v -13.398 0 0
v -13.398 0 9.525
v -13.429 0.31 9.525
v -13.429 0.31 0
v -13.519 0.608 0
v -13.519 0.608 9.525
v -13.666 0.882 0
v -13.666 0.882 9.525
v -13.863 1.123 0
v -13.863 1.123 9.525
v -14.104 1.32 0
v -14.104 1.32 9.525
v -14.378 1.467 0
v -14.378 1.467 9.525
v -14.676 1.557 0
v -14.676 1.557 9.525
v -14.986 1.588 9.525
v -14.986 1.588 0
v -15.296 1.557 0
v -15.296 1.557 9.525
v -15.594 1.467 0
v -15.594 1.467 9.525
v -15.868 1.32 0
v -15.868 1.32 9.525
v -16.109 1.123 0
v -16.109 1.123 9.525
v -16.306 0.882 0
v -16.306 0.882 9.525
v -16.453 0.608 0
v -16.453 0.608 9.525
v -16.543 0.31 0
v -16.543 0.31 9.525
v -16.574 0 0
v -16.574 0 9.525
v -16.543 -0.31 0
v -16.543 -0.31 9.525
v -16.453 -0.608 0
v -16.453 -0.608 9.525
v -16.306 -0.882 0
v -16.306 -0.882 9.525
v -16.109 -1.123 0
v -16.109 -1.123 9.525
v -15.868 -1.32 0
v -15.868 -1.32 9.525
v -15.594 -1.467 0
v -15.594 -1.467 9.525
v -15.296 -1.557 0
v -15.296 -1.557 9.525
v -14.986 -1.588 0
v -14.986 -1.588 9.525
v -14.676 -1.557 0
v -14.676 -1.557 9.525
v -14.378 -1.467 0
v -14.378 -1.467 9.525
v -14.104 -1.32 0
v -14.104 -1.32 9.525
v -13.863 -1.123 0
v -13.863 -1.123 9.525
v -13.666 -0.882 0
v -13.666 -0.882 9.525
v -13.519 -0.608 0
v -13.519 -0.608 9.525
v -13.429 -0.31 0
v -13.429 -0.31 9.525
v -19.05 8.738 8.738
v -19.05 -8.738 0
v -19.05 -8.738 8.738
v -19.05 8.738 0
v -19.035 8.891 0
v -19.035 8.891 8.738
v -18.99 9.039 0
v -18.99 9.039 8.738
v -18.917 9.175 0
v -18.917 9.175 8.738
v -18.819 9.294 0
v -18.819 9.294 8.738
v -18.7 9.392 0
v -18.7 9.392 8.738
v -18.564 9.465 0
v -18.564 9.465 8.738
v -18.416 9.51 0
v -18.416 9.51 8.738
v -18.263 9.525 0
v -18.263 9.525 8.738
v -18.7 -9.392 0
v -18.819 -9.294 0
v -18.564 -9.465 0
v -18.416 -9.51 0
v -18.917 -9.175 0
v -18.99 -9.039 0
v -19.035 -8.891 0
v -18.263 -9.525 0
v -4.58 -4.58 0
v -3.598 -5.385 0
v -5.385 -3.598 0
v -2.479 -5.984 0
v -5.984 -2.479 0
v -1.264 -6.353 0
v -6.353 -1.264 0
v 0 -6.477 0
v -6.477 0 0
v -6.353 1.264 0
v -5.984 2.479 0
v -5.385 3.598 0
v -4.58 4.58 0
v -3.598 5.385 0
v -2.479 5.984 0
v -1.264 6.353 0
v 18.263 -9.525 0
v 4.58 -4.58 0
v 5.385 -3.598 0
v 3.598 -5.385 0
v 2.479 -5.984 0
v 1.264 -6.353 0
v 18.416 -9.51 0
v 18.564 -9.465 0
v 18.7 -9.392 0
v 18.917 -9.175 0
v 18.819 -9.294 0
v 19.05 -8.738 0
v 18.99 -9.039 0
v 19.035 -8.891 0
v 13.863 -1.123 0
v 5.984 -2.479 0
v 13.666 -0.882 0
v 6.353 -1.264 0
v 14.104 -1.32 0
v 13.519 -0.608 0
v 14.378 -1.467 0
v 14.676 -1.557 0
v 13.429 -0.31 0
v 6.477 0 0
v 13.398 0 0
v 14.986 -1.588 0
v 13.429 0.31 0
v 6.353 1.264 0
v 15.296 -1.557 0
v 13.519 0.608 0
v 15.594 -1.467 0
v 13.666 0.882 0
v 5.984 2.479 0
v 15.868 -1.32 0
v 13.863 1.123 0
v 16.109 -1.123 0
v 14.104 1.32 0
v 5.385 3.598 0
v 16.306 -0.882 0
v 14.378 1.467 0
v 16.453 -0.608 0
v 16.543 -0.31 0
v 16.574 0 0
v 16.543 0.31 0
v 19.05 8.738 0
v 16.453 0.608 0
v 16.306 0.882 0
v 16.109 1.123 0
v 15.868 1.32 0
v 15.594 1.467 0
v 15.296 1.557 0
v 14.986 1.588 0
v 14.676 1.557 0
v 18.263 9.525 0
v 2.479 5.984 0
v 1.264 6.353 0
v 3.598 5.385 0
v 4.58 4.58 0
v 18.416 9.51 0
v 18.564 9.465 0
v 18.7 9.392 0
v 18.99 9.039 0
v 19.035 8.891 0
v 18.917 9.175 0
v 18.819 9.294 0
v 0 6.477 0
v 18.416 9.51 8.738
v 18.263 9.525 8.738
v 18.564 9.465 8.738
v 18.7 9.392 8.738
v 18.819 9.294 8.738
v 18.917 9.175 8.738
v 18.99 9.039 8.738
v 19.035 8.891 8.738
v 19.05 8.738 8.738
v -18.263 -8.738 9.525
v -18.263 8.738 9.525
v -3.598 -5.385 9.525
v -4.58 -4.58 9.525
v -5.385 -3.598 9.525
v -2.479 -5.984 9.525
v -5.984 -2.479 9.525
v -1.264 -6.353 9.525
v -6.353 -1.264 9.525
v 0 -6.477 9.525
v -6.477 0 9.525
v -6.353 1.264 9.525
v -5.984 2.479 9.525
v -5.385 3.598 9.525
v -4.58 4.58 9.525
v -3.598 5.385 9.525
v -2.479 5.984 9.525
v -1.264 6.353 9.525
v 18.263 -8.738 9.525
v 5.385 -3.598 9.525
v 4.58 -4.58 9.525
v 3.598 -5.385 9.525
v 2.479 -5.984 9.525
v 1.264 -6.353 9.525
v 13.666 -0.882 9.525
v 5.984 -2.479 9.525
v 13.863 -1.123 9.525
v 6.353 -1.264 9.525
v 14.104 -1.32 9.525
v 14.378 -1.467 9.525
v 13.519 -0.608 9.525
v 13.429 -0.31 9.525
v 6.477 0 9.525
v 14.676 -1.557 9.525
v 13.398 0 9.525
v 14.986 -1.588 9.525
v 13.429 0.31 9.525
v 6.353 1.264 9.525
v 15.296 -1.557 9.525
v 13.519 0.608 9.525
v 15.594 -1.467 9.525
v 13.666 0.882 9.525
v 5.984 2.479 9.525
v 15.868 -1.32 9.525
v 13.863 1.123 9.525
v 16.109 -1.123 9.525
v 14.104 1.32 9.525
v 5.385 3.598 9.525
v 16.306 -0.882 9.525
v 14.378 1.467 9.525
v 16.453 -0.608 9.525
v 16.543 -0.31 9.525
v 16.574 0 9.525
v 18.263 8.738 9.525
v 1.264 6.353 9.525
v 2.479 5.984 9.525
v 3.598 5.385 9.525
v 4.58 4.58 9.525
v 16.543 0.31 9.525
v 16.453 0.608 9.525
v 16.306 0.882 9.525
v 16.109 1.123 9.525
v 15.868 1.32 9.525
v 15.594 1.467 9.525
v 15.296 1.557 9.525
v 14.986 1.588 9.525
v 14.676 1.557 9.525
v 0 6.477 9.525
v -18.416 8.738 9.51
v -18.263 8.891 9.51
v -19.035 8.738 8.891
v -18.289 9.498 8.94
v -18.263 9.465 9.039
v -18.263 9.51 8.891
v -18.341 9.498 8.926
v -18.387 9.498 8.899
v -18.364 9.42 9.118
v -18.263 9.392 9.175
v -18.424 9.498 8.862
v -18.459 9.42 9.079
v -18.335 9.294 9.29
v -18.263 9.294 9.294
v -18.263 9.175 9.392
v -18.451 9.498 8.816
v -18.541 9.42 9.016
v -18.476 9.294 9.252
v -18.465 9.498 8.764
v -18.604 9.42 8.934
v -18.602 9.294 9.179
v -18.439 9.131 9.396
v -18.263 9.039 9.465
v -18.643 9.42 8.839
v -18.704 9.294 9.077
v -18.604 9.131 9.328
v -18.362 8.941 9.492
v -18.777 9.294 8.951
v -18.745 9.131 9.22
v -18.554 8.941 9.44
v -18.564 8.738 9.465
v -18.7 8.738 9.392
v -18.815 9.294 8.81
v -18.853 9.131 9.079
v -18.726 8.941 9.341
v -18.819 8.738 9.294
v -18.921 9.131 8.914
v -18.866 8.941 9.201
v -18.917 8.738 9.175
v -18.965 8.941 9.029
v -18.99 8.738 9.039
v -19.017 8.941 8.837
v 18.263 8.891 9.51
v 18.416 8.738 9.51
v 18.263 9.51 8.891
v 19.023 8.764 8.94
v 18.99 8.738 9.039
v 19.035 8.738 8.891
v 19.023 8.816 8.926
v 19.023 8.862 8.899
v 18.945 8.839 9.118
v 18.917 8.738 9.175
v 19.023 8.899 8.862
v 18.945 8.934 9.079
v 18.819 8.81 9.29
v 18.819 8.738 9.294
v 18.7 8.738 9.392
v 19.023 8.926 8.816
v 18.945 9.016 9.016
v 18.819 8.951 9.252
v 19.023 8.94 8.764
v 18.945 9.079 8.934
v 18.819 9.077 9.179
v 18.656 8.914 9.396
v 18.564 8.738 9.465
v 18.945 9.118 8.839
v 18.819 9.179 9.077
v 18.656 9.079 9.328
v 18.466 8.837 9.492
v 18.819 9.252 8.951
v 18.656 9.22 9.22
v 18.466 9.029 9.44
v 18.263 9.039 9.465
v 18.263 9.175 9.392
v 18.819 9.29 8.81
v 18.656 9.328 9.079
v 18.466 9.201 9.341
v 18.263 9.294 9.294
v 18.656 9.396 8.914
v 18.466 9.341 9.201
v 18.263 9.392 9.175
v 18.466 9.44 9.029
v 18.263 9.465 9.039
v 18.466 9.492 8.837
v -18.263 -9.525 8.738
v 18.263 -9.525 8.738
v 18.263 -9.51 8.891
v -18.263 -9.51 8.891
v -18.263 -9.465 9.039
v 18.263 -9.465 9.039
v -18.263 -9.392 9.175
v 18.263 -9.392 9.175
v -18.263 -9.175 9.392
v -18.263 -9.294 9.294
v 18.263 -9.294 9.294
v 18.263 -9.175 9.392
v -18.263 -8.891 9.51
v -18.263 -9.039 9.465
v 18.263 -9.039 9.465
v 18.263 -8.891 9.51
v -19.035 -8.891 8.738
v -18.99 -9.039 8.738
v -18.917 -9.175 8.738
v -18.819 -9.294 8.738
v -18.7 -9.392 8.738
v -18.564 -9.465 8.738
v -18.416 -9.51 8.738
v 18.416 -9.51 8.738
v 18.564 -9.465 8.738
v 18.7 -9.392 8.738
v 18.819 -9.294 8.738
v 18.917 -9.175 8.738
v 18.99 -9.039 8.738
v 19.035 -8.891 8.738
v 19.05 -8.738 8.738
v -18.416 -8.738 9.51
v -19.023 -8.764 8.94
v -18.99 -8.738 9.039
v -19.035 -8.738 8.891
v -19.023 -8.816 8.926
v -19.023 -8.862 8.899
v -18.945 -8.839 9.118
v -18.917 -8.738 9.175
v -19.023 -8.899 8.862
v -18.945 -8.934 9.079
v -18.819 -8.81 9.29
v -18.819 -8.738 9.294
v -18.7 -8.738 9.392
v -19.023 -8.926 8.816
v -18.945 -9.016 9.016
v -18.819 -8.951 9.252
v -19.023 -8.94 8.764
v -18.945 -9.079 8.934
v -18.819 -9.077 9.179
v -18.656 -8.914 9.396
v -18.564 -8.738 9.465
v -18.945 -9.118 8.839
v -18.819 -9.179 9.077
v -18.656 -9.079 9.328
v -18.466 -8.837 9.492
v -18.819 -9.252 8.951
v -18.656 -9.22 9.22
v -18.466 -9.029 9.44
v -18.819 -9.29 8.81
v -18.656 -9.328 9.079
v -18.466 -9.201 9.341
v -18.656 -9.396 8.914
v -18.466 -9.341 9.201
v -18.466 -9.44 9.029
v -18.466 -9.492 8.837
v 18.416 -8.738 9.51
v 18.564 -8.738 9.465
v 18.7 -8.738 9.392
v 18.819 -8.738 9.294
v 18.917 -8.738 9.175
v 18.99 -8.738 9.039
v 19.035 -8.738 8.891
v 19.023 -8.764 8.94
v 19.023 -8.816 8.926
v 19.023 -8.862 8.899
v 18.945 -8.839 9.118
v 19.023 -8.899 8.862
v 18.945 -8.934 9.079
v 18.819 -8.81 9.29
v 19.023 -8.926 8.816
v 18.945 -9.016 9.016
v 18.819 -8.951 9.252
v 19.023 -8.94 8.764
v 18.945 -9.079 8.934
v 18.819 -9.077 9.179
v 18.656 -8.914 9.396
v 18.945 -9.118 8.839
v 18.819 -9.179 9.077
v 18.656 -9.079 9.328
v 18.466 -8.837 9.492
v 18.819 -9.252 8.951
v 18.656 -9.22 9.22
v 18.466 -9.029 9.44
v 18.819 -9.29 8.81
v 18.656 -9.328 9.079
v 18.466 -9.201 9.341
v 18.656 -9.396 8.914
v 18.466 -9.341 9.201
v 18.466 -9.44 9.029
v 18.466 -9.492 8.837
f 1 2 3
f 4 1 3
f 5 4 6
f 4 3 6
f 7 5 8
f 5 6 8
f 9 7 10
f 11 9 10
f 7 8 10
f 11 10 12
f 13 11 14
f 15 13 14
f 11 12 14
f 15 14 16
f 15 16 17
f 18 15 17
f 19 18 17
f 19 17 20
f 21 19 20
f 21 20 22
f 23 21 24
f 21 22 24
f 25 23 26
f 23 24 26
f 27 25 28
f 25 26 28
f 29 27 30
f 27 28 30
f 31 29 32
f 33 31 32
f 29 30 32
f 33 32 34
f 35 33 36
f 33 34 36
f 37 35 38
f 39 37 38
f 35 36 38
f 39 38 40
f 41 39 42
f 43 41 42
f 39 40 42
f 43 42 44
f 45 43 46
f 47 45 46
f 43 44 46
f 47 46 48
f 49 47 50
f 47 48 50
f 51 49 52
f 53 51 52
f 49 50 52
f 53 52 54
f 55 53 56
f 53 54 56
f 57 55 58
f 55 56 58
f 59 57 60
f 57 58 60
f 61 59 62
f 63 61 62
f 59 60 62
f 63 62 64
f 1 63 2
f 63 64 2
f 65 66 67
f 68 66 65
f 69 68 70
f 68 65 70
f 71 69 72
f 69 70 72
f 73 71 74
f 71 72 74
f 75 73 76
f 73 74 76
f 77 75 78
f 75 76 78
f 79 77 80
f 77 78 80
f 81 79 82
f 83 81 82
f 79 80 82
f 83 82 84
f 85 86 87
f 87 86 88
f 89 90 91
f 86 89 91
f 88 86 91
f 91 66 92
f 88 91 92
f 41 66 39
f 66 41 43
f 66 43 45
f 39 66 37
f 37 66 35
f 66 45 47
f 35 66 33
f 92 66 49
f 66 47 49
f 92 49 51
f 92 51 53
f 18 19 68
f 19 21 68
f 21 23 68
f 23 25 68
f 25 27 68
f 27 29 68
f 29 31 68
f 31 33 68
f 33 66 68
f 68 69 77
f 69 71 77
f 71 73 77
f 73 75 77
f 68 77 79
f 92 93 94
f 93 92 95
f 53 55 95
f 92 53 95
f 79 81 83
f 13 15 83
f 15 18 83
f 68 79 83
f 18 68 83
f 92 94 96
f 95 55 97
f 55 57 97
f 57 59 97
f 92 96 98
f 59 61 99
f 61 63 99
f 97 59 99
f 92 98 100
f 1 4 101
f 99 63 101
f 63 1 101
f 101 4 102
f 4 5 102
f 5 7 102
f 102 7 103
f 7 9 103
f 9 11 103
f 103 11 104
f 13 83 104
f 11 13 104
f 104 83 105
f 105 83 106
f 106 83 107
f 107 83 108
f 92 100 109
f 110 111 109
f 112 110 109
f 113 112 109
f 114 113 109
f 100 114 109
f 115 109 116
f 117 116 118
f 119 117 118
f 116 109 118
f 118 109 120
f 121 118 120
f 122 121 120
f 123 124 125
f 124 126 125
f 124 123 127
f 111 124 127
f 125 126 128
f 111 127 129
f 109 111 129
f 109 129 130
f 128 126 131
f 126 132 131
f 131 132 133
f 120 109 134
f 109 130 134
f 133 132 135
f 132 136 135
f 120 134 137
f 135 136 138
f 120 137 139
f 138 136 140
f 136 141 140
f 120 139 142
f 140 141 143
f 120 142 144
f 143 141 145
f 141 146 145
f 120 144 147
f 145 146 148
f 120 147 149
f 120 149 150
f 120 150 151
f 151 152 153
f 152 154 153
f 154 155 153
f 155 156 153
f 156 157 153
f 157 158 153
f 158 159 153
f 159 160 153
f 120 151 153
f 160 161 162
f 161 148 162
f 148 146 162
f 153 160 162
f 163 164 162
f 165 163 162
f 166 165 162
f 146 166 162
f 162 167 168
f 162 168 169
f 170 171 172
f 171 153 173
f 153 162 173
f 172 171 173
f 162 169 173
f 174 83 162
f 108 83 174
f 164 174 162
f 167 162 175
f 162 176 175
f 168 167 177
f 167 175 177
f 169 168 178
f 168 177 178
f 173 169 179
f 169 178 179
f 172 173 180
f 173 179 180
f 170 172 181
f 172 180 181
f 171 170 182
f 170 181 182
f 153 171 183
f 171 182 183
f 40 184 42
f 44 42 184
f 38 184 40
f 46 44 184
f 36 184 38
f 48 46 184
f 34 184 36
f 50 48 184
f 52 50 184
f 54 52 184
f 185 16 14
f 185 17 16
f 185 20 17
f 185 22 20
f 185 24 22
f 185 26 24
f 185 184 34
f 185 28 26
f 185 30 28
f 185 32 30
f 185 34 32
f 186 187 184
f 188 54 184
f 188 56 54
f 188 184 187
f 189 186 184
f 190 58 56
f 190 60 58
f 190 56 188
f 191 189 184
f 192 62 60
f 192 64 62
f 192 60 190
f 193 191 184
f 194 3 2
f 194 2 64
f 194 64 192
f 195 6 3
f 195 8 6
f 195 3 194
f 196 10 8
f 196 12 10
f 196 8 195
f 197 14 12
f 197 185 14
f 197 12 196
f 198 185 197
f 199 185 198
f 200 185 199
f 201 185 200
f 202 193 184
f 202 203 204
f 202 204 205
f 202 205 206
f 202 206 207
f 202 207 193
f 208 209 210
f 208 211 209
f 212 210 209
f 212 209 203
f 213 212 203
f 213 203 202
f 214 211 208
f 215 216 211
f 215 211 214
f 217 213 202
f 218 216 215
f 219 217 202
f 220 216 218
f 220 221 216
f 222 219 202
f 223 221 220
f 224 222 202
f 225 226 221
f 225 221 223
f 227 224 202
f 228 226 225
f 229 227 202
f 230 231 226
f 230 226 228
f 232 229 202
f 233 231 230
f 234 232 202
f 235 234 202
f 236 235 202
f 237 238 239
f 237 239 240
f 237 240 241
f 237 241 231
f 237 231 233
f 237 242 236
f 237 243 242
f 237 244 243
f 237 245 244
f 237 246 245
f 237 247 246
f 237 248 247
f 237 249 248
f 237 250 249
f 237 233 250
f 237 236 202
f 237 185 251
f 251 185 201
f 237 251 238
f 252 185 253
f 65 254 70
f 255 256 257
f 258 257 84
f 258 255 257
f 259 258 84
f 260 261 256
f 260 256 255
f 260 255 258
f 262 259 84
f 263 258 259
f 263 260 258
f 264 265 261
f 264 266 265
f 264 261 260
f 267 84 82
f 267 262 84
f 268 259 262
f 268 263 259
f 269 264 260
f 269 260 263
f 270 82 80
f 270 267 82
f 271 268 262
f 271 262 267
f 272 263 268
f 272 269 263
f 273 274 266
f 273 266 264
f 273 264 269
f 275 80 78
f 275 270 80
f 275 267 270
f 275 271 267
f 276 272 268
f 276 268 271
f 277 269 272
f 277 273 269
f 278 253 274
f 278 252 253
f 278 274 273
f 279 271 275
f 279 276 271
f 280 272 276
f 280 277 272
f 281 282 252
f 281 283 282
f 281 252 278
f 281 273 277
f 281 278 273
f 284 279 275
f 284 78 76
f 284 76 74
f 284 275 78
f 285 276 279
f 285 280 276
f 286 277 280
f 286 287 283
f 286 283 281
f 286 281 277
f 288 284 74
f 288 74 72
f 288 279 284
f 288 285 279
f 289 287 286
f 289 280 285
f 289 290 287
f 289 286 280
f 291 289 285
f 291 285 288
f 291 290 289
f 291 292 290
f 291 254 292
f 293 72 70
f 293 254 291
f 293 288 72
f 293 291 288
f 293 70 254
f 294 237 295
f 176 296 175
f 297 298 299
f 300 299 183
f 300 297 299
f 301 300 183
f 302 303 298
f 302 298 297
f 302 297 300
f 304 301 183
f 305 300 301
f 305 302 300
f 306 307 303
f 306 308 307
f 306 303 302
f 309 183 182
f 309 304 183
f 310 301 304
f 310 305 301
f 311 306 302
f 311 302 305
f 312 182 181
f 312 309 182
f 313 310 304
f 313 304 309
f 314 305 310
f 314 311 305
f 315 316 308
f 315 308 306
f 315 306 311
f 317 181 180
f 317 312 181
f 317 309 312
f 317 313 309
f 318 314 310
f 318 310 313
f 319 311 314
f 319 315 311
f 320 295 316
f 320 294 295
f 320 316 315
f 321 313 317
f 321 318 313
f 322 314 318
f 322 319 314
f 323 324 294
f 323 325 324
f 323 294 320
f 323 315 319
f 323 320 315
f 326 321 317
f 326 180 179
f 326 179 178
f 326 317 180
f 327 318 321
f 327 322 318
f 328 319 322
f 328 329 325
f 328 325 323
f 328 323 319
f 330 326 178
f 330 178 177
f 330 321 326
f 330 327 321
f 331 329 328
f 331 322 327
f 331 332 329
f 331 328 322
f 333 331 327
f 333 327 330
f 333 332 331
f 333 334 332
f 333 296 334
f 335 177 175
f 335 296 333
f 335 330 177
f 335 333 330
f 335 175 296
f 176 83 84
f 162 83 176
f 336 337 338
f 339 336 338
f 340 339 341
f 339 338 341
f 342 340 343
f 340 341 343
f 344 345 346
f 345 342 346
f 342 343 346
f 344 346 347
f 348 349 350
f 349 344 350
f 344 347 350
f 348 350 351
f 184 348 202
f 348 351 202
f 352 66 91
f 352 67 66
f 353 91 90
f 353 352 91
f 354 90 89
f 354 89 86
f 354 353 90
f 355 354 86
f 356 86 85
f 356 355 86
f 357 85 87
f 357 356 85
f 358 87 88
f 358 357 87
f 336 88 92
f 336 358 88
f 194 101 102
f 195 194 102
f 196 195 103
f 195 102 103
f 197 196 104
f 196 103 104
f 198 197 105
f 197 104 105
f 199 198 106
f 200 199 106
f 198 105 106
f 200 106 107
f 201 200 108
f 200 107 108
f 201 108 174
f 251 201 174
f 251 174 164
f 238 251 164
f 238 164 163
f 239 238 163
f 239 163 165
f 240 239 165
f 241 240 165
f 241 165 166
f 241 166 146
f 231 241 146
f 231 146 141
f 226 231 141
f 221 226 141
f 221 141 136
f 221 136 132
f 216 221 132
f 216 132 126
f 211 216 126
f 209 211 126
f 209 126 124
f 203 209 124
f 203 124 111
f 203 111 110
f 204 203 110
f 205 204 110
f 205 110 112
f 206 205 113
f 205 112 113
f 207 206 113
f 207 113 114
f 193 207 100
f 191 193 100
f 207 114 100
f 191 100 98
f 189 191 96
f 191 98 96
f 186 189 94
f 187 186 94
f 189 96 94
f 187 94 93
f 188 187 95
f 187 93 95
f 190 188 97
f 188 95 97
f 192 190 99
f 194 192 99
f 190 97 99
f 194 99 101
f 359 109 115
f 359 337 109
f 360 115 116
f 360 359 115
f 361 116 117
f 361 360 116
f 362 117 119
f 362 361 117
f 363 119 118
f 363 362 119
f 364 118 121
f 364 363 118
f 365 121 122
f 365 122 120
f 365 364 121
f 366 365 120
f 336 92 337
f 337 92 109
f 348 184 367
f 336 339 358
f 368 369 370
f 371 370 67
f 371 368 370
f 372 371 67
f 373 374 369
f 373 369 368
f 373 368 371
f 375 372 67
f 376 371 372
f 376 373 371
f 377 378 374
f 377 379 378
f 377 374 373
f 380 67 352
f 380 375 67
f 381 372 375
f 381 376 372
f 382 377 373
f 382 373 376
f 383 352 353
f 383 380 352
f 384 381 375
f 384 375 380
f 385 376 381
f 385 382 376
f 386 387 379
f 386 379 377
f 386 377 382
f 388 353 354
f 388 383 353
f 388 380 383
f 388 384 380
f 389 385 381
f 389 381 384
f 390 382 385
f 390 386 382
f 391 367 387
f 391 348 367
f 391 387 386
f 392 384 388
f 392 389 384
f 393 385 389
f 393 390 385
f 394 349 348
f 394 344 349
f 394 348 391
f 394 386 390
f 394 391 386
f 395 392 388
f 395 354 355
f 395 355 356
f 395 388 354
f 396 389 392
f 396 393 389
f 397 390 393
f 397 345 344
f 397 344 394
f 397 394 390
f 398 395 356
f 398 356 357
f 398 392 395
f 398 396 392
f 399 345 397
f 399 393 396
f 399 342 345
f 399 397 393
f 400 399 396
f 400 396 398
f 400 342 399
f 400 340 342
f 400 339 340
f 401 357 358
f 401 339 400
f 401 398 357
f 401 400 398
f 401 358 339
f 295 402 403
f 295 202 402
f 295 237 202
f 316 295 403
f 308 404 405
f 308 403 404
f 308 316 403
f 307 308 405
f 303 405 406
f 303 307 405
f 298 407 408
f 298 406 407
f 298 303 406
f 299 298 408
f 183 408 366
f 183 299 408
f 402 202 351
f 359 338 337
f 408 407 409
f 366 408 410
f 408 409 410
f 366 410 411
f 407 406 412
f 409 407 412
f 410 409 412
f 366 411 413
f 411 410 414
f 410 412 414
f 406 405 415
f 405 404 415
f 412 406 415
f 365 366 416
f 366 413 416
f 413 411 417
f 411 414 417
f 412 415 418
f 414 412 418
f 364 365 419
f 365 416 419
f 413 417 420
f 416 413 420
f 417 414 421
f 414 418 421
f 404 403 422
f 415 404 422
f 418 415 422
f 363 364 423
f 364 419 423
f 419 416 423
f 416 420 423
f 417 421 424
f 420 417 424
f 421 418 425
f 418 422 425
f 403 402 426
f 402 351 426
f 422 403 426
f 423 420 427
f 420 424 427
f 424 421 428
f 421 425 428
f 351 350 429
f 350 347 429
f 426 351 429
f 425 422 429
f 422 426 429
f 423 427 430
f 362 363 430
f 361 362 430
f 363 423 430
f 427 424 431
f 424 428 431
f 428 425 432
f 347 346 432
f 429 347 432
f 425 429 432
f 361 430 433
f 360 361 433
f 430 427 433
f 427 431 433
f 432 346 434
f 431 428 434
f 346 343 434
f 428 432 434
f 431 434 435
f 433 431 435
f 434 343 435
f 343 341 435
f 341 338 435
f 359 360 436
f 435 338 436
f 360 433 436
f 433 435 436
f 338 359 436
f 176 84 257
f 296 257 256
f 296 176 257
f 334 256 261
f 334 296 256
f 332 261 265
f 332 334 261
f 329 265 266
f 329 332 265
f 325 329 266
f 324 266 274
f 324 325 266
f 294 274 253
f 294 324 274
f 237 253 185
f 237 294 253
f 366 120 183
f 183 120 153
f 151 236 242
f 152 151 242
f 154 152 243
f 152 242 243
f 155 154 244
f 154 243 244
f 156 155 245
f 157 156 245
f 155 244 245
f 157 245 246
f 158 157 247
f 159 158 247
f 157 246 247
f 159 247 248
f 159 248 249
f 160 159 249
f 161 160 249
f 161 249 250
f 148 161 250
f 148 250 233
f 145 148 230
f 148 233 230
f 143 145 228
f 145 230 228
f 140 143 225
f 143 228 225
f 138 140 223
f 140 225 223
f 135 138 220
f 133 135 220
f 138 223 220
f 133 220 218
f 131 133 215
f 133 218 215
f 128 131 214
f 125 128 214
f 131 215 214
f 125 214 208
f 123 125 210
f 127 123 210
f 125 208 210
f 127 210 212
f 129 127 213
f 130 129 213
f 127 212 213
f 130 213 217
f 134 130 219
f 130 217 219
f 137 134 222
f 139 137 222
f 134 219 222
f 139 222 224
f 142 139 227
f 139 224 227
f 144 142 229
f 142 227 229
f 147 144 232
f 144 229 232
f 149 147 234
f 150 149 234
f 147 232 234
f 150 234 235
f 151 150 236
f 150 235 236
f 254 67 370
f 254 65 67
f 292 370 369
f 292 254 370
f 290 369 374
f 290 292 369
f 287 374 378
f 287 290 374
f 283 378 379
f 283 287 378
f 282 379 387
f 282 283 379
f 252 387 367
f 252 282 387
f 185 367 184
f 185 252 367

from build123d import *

# Parameters (mm, degrees)
F0_W     = 38.1
F0_H     = 19.05
F1_DEPTH = 9.525
F2_R     = 1.5875
F3_DEPTH = 9.525
F4_R     = 0.7874
F5_D     = 12.954


with BuildPart() as f1:
    # F0 (on Top) → F1 (new body)
    with BuildSketch(Plane.XY):
        Rectangle(F0_W, F0_H)
    extrude(amount=F1_DEPTH)

    # F2 (on face) → F3 (cut, through all)
    with BuildSketch(Plane.XY.offset(9.525)):
        with Locations((-14.986, 0)):
            Circle(F2_R)
        with Locations((14.986, 0)):
            Circle(F2_R)
    extrude(amount=-F3_DEPTH, mode=Mode.SUBTRACT)

    # F4
    f4_edges = [f1.edges().sort_by_distance(p)[0] for p in [
        (0, -9.525, 9.525),
        (-19.05, 0, 9.525),
        (0, 9.525, 9.525),
        (19.05, 0, 9.525),
        (19.05, -9.525, 4.7625),
        (19.05, 9.525, 4.7625),
        (-19.05, -9.525, 4.7625),
        (-19.05, 9.525, 4.7625),
    ]]
    fillet(f4_edges, radius=F4_R)

    # F5 (through all)
    with Locations(Plane.XY.offset(9.525)):
        with Locations((0, 0)):
            Hole(F5_D / 2)


solid = f1.part
